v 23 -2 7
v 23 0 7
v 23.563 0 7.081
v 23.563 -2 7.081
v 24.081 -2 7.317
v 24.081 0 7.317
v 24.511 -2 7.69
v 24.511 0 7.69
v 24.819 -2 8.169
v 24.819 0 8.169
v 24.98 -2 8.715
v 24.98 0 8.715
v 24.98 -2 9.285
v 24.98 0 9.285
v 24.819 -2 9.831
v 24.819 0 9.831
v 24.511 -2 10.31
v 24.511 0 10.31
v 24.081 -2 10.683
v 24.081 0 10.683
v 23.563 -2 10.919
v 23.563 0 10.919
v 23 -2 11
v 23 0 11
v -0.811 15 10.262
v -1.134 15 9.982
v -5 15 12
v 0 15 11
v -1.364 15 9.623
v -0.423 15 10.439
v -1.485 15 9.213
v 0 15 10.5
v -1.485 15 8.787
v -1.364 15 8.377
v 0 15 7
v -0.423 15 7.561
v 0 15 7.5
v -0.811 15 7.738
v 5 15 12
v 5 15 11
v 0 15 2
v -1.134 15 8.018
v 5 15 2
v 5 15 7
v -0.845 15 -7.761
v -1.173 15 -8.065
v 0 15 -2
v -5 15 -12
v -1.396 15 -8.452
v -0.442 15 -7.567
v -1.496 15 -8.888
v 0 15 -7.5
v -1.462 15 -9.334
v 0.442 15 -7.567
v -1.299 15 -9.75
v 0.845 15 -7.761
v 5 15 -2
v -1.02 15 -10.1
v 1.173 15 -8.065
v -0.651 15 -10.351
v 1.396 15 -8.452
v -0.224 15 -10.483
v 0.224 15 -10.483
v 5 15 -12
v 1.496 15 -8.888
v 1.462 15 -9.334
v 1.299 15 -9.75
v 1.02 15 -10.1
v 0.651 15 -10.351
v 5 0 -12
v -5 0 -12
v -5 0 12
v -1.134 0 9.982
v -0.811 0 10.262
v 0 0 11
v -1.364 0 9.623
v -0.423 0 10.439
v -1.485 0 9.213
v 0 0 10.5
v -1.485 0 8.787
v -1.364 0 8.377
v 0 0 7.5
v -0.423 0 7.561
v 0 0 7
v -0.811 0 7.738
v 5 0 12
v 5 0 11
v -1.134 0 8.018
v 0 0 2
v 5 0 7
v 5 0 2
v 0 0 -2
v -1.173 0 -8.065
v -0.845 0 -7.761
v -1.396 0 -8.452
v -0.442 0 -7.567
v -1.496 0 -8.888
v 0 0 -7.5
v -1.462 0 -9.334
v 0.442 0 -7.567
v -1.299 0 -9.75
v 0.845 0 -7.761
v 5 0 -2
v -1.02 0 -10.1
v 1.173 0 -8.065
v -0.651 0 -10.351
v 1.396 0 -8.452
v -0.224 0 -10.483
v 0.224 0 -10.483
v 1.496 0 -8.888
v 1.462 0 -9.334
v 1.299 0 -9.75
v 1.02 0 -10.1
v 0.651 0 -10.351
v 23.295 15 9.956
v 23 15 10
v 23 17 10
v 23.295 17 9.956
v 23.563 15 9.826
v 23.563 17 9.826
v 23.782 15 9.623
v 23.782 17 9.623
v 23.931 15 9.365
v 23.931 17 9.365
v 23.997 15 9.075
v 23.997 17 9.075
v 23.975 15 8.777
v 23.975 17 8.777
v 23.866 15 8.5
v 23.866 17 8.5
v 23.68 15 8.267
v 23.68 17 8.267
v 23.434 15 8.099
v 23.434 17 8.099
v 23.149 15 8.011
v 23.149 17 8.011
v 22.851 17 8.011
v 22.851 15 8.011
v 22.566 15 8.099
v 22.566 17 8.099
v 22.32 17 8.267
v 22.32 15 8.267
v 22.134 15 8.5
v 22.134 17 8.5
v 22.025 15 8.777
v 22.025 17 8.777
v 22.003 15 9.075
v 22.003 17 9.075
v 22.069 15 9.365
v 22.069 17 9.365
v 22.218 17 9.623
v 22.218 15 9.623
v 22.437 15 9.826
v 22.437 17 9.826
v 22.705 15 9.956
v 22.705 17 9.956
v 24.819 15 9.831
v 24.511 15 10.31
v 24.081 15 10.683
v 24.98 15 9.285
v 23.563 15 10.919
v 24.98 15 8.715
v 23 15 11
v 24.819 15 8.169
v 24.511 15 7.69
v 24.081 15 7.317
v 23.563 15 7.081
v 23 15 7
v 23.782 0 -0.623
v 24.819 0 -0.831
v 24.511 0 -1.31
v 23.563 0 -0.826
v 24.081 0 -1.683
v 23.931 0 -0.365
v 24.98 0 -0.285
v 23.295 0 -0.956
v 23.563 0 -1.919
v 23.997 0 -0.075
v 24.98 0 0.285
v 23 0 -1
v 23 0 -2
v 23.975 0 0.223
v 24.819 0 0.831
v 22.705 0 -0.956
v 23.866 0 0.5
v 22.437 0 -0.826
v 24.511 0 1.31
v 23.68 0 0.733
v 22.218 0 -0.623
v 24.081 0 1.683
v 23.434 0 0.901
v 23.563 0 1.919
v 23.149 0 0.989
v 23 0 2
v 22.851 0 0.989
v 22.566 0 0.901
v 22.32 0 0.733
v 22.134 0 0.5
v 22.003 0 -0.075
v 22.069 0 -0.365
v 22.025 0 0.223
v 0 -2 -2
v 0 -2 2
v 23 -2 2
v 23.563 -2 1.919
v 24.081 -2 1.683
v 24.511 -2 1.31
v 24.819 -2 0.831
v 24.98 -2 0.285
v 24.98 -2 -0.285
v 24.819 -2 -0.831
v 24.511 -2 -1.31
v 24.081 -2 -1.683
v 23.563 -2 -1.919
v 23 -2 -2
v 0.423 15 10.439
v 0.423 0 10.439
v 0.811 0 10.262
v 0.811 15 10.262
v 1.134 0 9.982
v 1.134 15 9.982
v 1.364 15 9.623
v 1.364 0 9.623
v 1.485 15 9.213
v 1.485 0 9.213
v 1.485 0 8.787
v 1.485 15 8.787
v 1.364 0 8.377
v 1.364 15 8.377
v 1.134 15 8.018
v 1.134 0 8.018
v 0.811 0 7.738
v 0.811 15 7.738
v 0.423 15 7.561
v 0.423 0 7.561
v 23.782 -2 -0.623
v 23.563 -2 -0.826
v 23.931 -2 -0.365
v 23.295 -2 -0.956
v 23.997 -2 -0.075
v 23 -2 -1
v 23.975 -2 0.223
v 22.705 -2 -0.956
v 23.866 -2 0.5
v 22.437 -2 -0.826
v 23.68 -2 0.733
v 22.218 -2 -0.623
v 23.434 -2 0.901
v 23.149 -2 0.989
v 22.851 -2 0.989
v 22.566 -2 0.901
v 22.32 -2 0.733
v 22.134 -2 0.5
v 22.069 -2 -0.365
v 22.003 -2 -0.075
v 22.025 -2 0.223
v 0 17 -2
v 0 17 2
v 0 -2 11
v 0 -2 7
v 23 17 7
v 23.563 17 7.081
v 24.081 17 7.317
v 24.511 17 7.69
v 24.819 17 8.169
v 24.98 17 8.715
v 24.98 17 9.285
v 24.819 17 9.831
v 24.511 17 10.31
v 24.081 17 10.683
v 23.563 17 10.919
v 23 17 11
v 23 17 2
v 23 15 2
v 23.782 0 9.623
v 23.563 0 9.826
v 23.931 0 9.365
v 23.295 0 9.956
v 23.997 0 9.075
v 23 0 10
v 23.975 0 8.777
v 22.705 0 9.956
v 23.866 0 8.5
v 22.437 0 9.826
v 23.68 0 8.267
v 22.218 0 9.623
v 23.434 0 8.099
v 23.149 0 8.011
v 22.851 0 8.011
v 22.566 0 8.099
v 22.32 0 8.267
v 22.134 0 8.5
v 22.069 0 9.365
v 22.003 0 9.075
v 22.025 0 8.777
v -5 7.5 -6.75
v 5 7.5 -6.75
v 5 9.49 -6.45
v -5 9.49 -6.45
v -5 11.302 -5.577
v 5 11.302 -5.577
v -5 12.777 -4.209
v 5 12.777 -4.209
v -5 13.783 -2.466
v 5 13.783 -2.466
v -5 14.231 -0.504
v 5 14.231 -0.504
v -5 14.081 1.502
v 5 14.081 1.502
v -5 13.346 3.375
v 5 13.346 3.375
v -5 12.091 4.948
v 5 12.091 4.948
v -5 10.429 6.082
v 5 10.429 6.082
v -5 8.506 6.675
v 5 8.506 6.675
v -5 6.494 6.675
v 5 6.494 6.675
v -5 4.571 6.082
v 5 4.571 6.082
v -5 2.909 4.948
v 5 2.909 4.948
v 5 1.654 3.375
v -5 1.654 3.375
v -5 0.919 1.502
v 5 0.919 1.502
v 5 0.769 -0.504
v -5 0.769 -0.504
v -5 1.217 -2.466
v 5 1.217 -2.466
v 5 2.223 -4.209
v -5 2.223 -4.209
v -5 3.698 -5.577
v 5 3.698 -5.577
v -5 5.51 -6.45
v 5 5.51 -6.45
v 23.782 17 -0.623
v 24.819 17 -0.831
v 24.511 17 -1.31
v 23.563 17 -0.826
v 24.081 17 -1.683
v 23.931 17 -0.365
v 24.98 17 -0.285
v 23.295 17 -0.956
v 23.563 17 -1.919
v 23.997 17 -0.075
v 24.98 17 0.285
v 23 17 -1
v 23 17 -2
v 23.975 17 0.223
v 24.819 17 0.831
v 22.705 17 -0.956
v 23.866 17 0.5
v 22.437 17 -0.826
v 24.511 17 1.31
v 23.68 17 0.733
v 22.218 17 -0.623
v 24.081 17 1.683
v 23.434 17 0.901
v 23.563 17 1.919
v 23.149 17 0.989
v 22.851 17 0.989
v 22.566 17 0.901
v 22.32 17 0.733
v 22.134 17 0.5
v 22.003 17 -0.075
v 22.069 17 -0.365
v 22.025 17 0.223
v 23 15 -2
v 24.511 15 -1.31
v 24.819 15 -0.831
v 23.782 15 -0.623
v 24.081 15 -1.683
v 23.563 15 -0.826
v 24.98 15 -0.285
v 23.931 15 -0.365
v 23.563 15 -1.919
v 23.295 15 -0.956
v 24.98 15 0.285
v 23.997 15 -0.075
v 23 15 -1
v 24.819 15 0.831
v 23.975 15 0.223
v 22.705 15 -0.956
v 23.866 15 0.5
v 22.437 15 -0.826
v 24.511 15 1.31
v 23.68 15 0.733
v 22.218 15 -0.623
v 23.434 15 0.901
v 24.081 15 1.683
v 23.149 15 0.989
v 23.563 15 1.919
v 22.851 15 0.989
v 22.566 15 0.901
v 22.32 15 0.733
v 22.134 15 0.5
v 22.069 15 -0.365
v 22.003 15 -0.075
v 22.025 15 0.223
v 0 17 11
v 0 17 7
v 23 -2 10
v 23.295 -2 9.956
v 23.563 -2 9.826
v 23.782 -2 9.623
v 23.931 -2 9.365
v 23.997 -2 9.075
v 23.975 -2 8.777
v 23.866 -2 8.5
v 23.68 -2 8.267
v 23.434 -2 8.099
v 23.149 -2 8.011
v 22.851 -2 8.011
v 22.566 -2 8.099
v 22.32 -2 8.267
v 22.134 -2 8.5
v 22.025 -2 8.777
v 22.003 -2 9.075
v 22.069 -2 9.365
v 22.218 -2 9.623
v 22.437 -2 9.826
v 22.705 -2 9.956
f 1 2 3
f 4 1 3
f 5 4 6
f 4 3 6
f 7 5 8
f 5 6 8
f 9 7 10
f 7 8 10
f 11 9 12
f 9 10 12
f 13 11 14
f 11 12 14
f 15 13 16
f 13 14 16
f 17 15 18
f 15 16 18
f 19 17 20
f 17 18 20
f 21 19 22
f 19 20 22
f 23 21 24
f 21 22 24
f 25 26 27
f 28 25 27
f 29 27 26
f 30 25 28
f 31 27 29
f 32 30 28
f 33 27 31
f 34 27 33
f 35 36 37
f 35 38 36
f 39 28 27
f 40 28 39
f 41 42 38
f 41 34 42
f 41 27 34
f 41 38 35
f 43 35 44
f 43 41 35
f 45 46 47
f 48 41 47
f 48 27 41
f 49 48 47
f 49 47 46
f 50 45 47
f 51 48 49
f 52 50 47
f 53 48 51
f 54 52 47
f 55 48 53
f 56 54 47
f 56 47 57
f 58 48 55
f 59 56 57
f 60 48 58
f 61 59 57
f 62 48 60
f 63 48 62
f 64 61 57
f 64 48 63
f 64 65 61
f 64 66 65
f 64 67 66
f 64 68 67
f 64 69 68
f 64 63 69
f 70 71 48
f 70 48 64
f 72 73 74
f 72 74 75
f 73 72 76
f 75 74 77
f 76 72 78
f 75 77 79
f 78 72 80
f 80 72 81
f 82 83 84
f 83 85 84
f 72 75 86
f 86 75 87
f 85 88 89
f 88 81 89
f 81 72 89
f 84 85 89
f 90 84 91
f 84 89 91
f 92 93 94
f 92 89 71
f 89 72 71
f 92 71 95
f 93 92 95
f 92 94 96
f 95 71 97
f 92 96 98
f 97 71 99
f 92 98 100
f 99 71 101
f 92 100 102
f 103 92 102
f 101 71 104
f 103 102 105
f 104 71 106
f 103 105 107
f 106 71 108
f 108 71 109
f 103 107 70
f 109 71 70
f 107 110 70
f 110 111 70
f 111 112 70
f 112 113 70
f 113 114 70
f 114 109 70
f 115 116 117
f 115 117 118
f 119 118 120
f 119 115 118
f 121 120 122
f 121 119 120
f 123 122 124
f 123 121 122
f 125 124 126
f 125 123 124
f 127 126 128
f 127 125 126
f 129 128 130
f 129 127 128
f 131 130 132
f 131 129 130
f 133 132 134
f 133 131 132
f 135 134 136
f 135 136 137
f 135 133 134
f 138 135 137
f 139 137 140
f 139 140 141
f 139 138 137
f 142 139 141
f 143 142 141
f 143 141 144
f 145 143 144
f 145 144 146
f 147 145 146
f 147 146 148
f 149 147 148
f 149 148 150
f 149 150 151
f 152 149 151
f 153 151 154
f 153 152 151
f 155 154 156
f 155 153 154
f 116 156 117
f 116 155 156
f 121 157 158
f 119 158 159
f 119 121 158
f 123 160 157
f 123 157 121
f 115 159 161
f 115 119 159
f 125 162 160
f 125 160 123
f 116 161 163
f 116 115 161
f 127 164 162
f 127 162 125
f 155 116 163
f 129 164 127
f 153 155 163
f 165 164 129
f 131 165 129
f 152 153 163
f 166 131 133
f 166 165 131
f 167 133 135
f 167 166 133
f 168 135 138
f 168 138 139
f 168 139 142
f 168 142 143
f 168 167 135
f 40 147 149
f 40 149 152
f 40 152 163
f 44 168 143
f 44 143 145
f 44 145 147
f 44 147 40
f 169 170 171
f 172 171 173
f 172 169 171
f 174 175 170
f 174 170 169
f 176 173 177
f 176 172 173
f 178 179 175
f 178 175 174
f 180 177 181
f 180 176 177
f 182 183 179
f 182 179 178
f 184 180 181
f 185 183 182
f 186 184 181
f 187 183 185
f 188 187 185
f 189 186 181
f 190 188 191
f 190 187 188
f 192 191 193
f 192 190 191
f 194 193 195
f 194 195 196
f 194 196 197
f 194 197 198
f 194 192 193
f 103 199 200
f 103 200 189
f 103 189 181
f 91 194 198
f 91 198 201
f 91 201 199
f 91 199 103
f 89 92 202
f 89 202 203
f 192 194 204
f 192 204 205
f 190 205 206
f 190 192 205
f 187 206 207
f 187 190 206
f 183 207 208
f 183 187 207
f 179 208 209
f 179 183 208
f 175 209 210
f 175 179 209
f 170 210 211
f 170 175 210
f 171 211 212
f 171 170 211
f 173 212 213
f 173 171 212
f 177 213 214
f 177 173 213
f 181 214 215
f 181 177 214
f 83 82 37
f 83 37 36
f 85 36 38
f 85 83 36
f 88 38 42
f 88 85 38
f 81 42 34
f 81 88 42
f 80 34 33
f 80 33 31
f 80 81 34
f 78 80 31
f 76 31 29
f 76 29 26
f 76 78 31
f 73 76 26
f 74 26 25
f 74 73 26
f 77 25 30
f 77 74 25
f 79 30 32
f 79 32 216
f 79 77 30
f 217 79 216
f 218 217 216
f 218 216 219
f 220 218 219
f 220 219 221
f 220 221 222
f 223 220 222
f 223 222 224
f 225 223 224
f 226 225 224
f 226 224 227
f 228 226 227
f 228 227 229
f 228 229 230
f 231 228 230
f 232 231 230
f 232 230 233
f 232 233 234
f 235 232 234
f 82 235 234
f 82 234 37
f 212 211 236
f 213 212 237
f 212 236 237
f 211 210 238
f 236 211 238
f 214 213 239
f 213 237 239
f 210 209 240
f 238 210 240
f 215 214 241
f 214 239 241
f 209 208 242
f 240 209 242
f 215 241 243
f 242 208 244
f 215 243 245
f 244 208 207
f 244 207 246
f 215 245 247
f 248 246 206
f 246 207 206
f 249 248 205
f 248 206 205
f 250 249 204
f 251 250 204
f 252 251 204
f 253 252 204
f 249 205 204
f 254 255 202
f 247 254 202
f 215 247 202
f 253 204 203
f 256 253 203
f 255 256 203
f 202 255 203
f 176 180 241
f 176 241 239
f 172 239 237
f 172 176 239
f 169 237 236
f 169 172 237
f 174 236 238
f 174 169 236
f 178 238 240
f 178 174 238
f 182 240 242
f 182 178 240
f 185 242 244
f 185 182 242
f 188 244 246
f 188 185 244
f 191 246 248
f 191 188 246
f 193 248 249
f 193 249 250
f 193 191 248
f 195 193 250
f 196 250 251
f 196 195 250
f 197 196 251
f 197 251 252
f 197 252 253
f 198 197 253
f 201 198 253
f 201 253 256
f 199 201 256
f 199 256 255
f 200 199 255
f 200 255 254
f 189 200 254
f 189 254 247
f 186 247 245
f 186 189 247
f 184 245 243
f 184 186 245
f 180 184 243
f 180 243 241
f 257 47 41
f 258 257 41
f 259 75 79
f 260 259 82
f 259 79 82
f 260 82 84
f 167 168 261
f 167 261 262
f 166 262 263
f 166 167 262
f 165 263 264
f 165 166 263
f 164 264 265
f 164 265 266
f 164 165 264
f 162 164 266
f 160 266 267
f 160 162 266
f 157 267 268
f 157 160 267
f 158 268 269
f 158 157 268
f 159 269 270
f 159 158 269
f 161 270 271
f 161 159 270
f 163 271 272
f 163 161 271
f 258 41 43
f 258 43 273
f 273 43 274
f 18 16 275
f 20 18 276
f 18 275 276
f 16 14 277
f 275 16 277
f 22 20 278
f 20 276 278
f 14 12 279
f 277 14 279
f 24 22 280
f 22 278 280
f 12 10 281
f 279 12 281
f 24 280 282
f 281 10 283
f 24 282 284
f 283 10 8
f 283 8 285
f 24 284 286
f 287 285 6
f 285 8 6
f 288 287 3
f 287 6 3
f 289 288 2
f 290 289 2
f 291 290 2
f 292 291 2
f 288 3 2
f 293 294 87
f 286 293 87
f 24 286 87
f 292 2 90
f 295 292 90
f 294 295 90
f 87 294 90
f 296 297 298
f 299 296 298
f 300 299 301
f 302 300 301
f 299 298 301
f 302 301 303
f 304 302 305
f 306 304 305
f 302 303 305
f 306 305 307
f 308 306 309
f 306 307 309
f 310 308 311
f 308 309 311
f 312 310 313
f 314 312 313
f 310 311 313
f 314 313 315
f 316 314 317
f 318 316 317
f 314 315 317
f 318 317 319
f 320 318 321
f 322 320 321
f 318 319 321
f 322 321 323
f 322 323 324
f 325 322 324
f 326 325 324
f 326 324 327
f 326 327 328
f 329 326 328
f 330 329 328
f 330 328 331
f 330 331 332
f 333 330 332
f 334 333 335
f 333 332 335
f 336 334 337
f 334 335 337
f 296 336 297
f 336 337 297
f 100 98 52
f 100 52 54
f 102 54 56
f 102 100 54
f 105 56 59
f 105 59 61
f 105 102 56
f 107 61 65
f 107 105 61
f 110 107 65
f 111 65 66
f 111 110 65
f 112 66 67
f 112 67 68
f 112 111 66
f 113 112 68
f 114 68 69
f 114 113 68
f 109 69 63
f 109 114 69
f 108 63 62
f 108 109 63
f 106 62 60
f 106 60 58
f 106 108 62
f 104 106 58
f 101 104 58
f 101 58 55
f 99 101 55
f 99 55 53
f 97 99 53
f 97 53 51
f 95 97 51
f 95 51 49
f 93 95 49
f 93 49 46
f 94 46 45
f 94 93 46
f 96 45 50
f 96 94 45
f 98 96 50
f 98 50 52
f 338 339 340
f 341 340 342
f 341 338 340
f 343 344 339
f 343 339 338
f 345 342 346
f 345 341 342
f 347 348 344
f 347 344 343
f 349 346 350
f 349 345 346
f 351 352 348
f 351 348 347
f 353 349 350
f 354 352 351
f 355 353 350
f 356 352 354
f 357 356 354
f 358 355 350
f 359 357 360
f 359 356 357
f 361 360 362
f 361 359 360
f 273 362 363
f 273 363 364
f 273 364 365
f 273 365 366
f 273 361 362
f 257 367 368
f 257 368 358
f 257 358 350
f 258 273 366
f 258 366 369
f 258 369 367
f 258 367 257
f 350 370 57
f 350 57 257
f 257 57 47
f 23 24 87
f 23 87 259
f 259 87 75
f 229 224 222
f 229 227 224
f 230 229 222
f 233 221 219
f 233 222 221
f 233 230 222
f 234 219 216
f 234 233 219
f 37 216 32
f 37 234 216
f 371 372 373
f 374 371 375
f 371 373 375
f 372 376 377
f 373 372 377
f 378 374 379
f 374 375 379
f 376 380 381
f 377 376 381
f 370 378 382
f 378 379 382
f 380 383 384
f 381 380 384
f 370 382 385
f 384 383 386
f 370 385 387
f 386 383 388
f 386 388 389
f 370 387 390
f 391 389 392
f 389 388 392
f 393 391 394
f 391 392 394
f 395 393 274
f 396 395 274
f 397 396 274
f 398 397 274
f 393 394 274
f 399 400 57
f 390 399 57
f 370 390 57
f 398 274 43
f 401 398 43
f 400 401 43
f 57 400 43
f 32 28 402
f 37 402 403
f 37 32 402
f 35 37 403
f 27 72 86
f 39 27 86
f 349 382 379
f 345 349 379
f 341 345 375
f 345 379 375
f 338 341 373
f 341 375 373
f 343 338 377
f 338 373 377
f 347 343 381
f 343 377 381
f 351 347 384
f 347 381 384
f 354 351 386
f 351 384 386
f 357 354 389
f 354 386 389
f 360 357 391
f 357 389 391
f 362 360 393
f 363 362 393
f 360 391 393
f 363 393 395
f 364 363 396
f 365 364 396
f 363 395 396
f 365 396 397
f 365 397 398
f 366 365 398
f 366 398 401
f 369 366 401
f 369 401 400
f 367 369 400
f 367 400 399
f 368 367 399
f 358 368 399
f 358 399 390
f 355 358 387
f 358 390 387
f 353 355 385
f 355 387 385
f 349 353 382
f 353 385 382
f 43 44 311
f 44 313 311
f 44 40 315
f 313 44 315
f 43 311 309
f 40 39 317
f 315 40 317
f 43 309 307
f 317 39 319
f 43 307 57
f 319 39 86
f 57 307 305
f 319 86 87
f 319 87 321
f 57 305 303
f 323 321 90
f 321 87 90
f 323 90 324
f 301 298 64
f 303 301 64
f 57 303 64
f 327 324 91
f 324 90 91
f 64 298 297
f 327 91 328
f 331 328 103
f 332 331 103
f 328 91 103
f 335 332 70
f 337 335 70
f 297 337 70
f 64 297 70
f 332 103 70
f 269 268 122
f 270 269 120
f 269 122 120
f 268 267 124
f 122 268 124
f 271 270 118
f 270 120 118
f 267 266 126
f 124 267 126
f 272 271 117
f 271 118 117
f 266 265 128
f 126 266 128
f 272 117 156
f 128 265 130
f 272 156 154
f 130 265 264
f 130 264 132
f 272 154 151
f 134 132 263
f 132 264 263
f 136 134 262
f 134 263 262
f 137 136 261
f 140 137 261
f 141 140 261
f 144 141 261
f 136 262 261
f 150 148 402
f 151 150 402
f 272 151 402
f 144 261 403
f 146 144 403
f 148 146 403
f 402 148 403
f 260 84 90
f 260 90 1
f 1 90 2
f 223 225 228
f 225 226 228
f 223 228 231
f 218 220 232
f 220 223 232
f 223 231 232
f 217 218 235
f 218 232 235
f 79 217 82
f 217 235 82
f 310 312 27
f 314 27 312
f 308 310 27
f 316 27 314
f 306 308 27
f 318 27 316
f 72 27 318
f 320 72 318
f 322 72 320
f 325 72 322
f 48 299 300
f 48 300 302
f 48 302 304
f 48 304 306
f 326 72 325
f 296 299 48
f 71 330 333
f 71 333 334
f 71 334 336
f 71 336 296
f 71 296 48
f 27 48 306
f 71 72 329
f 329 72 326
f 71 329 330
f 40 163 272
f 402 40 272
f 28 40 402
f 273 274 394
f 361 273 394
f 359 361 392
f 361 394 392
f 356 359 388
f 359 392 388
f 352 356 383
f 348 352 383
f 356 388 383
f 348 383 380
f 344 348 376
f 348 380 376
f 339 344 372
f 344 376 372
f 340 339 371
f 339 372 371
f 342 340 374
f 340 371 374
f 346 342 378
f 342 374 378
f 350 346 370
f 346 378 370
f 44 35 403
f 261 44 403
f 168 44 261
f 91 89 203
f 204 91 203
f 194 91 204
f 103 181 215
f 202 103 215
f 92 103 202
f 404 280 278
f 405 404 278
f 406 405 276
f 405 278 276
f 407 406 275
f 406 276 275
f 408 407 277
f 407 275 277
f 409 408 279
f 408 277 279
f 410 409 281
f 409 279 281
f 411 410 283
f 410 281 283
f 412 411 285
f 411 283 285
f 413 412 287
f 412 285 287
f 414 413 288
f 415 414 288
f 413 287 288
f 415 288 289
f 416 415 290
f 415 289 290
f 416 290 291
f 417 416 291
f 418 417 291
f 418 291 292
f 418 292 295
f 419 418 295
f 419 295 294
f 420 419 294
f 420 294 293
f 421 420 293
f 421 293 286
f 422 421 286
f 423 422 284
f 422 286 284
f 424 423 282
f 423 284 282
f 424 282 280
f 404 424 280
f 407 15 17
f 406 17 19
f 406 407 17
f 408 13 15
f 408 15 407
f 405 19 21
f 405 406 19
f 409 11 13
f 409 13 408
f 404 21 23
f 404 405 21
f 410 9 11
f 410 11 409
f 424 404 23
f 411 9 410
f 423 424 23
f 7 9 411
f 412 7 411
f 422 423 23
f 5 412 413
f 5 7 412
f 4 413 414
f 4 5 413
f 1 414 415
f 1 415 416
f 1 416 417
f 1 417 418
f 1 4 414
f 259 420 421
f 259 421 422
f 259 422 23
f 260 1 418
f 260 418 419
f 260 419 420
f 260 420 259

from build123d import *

# Parameters (mm, degrees)
SKETCH2_W               = 10
SKETCH2_H               = 24
SKETCH2_R               = 1.5
BOSS_EXTRUDE1_DEPTH     = 15
SKETCH3_R               = 6.75
CUT_EXTRUDE1_DEPTH      = 10
SKETCH5_R               = 1
BOSS_EXTRUDE2_DEPTH     = 2
MIRROR2_COPY_1_SKETCH_R = 1
MIRROR2_COPY_1_DEPTH    = 2


with BuildPart() as part:
    # Sketch2 → Boss-Extrude1 (new body)
    with BuildSketch(Plane(origin=(0, 0, 0), x_dir=(1, 0, 0), z_dir=(0, 1, 0))):
        Rectangle(SKETCH2_W, SKETCH2_H)
        with Locations(Location((0, 9, 0), (0, 0, 270))):
            Circle(SKETCH2_R, mode=Mode.SUBTRACT)
        with Locations(Location((0, -9, 0), (0, 0, 90))):
            Circle(SKETCH2_R, mode=Mode.SUBTRACT)
    extrude(amount=BOSS_EXTRUDE1_DEPTH)

    # Sketch3 → Cut-Extrude1 (cut)
    with BuildSketch(Plane(origin=(5, 0, 0), x_dir=(0, 0, -1), z_dir=(1, 0, 0))):
        with Locations((0, 7.5)):
            Circle(SKETCH3_R)
    extrude(amount=-CUT_EXTRUDE1_DEPTH, mode=Mode.SUBTRACT)

    # Sketch5 → Boss-Extrude2 (add)
    with BuildSketch(Plane.XZ):
        with BuildLine():
            Line((0, 0), (0, 2))
            Line((0, 2), (23, 2))
            ThreePointArc((23, 2), (25, 0), (23, -2))
            Line((23, -2), (0, -2))
            Line((0, -2), (0, 0))
        make_face()
        with Locations(Location((23, 0, 0), (0, 0, 270))):
            Circle(SKETCH5_R, mode=Mode.SUBTRACT)
    boss_extrude2 = extrude(amount=BOSS_EXTRUDE2_DEPTH)

    # Mirror1: Boss-Extrude2 across plane
    add(boss_extrude2.mirror(Plane(origin=(0, 7.5, 0), x_dir=(0, 0, 1), z_dir=(0, -1, 0))))

    # Mirror2: Boss-Extrude2 across plane
    add(boss_extrude2.mirror(Plane.XY.offset(4.5)))

    # Mirror2 copy 1 sketch → Mirror2 copy 1 (add)
    with BuildSketch(Plane(origin=(0, 15, 9), x_dir=(1, 0, 0), z_dir=(0, 1, 0))):
        with BuildLine():
            Line((0, 0), (0, 2))
            Line((0, 2), (23, 2))
            ThreePointArc((23, 2), (25, 0), (23, -2))
            Line((23, -2), (0, -2))
            Line((0, -2), (0, 0))
        make_face()
        with Locations(Location((23, 0, 0), (0, 0, 270))):
            Circle(MIRROR2_COPY_1_SKETCH_R, mode=Mode.SUBTRACT)
    extrude(amount=MIRROR2_COPY_1_DEPTH)


solid = part.part
